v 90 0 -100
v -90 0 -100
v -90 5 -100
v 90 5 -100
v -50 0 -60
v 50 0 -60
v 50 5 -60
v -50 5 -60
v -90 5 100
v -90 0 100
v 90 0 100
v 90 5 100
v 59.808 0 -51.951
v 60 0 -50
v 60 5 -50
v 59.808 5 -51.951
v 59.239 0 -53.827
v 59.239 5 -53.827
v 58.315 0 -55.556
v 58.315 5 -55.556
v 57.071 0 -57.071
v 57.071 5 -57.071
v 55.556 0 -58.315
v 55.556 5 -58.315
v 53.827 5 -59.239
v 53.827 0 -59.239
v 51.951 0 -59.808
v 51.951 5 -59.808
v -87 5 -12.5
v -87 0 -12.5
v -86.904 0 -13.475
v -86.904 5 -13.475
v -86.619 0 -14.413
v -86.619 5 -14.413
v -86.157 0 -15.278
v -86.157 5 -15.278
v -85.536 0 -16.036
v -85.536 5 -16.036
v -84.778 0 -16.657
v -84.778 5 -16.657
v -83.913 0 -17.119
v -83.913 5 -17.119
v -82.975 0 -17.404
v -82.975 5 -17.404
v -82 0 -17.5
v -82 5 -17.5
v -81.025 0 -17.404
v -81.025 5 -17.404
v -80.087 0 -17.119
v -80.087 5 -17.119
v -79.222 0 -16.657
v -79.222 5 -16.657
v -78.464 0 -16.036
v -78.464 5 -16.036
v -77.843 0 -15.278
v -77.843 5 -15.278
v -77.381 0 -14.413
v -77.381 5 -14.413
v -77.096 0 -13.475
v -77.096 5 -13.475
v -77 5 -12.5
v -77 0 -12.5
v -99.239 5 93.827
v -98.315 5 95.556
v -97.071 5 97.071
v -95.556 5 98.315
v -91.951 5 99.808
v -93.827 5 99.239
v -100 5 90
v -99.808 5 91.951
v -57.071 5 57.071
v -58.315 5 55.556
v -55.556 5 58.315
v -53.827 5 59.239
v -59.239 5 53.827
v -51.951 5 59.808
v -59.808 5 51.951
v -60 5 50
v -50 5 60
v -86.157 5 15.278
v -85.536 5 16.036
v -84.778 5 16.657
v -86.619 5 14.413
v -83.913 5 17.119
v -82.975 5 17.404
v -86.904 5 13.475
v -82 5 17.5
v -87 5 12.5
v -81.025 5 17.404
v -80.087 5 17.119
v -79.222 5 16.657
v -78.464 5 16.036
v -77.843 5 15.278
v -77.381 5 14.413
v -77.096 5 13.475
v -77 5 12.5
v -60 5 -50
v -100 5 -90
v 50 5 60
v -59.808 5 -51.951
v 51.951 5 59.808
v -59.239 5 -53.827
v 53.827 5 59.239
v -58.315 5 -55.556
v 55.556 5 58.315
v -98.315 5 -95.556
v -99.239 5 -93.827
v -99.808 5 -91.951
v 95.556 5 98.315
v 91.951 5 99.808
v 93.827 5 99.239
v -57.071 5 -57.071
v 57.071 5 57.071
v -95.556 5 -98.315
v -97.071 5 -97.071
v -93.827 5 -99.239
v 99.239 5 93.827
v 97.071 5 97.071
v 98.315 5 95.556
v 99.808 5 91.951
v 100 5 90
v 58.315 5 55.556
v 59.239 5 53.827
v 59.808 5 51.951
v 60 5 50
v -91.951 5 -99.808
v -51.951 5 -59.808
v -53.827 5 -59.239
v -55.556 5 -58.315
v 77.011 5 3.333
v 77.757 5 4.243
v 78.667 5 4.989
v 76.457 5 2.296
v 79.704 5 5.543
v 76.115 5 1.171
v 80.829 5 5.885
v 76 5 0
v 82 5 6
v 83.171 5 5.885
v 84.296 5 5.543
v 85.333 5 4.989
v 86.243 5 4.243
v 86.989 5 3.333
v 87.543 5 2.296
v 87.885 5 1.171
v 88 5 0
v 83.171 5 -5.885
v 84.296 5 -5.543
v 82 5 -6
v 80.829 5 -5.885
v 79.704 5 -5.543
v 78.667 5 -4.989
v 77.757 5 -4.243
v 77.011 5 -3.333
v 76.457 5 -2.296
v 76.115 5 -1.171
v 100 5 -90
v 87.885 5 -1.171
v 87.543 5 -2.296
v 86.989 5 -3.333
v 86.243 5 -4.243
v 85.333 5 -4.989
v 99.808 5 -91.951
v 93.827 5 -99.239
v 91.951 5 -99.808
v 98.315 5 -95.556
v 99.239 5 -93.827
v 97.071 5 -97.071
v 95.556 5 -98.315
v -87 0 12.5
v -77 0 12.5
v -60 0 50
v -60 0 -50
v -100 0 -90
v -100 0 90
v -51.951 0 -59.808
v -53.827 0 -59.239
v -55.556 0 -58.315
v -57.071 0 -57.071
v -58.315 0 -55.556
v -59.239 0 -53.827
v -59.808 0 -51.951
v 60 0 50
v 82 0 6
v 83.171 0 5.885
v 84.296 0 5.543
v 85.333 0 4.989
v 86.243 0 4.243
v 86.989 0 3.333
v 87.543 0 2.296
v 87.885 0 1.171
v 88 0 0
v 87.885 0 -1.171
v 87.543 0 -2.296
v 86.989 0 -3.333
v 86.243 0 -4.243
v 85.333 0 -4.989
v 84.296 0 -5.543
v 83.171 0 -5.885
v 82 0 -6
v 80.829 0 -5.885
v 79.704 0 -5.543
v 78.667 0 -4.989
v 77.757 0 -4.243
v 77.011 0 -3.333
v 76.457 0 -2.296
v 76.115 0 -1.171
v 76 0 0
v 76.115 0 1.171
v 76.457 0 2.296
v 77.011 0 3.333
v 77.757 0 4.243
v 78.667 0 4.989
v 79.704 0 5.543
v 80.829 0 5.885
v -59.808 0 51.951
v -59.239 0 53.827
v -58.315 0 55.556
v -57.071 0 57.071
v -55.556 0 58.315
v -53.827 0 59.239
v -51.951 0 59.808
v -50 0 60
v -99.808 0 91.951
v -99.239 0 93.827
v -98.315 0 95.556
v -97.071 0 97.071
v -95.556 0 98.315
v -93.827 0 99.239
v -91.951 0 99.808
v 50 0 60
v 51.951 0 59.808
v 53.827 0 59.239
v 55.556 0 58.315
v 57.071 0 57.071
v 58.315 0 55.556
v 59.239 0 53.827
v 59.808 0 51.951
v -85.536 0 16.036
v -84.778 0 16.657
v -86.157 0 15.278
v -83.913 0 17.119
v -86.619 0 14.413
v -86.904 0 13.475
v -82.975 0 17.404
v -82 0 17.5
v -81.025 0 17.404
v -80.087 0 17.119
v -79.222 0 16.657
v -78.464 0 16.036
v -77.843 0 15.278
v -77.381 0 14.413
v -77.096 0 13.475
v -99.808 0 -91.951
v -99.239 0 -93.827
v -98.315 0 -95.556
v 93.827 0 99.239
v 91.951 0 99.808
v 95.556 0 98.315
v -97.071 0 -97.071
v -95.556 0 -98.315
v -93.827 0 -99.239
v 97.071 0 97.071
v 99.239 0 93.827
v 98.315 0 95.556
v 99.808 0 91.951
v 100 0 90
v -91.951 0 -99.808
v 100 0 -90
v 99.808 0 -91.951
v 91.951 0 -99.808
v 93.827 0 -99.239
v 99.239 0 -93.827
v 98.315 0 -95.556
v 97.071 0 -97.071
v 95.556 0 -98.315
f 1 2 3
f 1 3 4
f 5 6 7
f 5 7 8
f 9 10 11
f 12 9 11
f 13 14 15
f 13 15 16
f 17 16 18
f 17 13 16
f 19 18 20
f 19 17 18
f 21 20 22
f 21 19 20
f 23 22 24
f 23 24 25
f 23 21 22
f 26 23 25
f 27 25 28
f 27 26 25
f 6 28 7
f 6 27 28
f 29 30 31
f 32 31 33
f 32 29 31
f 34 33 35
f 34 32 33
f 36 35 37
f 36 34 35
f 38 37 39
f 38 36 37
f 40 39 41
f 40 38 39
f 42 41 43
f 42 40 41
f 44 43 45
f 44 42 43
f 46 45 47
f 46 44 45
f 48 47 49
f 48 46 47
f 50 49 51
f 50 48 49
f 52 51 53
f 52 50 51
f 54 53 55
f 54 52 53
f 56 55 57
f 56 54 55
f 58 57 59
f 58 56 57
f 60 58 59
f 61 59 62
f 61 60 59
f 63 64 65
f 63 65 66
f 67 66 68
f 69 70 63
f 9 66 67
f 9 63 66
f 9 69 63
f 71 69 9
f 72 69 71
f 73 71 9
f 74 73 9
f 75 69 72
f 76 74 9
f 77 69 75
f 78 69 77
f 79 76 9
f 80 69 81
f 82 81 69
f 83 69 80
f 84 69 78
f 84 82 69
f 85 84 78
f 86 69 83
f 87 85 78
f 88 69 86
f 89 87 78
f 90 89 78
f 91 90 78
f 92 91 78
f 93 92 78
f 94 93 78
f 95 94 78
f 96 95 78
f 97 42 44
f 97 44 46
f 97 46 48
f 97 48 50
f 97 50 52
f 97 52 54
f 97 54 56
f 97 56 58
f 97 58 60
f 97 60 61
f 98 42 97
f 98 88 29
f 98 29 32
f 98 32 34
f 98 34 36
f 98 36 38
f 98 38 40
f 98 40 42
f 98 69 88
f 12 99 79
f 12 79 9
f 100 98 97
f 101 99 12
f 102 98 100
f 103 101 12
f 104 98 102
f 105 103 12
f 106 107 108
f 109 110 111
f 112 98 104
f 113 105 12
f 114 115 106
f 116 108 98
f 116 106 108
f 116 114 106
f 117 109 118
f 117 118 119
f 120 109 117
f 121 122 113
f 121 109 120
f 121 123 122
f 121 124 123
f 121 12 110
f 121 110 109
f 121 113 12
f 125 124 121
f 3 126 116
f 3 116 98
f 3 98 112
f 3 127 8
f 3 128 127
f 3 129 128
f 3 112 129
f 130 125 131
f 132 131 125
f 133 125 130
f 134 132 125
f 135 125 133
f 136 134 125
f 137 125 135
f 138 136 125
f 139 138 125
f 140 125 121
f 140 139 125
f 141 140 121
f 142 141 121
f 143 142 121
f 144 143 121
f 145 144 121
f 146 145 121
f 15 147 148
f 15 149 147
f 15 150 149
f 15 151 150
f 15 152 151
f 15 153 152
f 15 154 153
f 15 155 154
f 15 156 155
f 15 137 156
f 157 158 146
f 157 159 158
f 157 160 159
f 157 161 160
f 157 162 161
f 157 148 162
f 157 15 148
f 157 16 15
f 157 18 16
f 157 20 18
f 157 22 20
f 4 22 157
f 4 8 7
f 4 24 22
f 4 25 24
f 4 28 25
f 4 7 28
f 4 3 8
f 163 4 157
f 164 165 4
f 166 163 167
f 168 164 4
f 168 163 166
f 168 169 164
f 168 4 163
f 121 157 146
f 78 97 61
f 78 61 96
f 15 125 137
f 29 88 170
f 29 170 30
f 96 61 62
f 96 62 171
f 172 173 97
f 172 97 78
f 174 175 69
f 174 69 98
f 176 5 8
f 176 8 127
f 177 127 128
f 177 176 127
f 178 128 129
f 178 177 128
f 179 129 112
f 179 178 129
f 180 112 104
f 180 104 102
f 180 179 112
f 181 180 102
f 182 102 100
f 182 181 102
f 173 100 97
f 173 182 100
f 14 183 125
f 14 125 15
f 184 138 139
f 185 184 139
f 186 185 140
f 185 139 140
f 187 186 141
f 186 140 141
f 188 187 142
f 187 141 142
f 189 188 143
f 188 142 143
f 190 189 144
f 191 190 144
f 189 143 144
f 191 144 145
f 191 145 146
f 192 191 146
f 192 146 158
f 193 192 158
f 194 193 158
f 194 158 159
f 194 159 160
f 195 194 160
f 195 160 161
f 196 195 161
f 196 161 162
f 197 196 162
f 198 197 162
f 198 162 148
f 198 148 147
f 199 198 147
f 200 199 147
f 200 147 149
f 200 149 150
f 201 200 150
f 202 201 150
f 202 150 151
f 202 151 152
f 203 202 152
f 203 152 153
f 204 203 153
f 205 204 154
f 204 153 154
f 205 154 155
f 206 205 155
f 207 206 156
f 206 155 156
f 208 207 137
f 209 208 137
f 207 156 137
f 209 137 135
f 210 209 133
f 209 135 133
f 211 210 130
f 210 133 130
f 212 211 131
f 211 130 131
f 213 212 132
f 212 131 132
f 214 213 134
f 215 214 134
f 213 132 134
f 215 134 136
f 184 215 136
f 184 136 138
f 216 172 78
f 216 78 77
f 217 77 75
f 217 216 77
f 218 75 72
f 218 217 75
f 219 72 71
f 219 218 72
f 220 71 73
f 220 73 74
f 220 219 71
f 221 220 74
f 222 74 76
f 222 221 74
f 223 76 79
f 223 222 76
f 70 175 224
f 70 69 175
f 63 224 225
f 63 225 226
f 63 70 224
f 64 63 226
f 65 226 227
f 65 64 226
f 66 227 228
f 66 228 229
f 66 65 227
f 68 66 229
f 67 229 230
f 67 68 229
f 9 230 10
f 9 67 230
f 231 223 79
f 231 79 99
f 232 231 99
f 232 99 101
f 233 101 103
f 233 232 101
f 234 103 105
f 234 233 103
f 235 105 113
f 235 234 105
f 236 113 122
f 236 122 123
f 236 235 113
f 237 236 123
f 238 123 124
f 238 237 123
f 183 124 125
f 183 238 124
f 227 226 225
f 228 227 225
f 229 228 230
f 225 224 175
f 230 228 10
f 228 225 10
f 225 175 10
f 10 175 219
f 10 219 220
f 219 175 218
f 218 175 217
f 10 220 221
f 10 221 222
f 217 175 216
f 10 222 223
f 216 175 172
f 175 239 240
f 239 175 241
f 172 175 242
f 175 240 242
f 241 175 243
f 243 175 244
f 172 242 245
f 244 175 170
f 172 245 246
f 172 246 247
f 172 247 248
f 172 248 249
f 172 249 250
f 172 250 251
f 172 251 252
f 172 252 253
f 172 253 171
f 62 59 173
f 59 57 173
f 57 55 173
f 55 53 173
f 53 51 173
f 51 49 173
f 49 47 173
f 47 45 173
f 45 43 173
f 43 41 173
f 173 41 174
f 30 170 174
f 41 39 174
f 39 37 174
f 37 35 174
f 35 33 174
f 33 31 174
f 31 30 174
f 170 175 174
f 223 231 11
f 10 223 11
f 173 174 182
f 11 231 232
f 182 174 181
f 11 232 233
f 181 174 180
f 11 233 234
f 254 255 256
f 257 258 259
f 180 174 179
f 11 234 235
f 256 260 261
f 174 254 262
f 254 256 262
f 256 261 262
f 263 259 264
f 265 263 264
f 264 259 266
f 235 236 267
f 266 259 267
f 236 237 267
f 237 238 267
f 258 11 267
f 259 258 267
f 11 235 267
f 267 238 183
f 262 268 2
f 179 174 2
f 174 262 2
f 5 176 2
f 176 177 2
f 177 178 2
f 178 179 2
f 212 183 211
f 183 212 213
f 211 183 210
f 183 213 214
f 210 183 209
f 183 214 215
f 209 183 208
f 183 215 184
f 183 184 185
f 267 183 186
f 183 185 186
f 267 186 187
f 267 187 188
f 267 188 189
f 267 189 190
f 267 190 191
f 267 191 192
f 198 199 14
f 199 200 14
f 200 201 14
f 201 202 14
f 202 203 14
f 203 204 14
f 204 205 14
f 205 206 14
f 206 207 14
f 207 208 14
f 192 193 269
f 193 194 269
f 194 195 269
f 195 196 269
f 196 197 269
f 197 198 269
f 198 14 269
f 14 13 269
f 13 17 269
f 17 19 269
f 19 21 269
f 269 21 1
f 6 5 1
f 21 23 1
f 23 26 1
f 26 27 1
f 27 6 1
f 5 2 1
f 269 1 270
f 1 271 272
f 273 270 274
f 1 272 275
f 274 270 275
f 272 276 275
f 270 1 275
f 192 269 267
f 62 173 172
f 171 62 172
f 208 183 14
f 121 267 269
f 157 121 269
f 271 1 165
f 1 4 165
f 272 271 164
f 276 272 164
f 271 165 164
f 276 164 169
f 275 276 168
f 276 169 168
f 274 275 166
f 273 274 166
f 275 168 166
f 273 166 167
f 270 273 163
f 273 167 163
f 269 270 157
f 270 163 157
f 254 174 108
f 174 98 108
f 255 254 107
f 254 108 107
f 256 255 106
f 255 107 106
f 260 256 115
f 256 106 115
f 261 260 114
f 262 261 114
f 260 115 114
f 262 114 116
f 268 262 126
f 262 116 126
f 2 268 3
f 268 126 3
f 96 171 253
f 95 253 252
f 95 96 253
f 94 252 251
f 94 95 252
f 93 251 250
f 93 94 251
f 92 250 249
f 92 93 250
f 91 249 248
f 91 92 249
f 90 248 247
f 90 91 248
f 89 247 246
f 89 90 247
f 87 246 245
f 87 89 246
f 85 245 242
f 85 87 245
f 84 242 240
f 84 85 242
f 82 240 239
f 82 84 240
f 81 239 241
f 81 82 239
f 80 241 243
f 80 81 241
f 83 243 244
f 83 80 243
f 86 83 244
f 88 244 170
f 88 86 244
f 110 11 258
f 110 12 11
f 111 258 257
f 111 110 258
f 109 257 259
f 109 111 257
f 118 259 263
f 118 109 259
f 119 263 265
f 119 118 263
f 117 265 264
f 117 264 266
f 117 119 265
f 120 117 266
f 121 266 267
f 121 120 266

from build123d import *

# Parameters (mm, degrees)
SKETCH1_W           = 200
SKETCH1_H           = 200
BOSS_EXTRUDE1_DEPTH = 5
SKETCH2_R           = 6
CUT_EXTRUDE1_DEPTH  = 12
REDONDEO1_R         = 10


with BuildPart() as part:
    # Sketch1 → Boss-Extrude1 (new body)
    with BuildSketch(Plane(origin=(0, 0, 0), x_dir=(1, 0, 0), z_dir=(0, 1, 0))):
        Rectangle(SKETCH1_W, SKETCH1_H)
        with BuildLine():
            Line((-50, -60), (50, -60))
            ThreePointArc((50, -60), (57.071067812, -57.071067812), (60, -50))
            Line((60, -50), (60, 50))
            ThreePointArc((60, 50), (57.071067812, 57.071067812), (50, 60))
            Line((50, 60), (-50, 60))
            ThreePointArc((-50, 60), (-57.071067812, 57.071067812), (-60, 50))
            Line((-60, 50), (-60, -50))
            ThreePointArc((-60, -50), (-57.071067812, -57.071067812), (-50, -60))
        make_face(mode=Mode.SUBTRACT)
    extrude(amount=BOSS_EXTRUDE1_DEPTH)

    # Sketch2 → Cut-Extrude1 (cut)
    with BuildSketch(Plane(origin=(0, 5, 0), x_dir=(1, 0, 0), z_dir=(0, 1, 0))):
        with Locations(Location((82, 0, 0), (0, 0, 270))):
            Circle(SKETCH2_R)
        with BuildLine():
            Line((-87, -12.5), (-87, 12.5))
            ThreePointArc((-87, 12.5), (-82, 17.5), (-77, 12.5))
            Line((-77, 12.5), (-77, -12.5))
            ThreePointArc((-77, -12.5), (-82, -17.5), (-87, -12.5))
        make_face()
    extrude(amount=-CUT_EXTRUDE1_DEPTH, mode=Mode.SUBTRACT)

    # Redondeo1
    redondeo1_edges = [part.edges().sort_by_distance(p)[0] for p in [
        (100, 2.5, 100),
        (-100, 2.5, 100),
        (-100, 2.5, -100),
        (100, 2.5, -100),
    ]]
    fillet(redondeo1_edges, radius=REDONDEO1_R)


solid = part.part
